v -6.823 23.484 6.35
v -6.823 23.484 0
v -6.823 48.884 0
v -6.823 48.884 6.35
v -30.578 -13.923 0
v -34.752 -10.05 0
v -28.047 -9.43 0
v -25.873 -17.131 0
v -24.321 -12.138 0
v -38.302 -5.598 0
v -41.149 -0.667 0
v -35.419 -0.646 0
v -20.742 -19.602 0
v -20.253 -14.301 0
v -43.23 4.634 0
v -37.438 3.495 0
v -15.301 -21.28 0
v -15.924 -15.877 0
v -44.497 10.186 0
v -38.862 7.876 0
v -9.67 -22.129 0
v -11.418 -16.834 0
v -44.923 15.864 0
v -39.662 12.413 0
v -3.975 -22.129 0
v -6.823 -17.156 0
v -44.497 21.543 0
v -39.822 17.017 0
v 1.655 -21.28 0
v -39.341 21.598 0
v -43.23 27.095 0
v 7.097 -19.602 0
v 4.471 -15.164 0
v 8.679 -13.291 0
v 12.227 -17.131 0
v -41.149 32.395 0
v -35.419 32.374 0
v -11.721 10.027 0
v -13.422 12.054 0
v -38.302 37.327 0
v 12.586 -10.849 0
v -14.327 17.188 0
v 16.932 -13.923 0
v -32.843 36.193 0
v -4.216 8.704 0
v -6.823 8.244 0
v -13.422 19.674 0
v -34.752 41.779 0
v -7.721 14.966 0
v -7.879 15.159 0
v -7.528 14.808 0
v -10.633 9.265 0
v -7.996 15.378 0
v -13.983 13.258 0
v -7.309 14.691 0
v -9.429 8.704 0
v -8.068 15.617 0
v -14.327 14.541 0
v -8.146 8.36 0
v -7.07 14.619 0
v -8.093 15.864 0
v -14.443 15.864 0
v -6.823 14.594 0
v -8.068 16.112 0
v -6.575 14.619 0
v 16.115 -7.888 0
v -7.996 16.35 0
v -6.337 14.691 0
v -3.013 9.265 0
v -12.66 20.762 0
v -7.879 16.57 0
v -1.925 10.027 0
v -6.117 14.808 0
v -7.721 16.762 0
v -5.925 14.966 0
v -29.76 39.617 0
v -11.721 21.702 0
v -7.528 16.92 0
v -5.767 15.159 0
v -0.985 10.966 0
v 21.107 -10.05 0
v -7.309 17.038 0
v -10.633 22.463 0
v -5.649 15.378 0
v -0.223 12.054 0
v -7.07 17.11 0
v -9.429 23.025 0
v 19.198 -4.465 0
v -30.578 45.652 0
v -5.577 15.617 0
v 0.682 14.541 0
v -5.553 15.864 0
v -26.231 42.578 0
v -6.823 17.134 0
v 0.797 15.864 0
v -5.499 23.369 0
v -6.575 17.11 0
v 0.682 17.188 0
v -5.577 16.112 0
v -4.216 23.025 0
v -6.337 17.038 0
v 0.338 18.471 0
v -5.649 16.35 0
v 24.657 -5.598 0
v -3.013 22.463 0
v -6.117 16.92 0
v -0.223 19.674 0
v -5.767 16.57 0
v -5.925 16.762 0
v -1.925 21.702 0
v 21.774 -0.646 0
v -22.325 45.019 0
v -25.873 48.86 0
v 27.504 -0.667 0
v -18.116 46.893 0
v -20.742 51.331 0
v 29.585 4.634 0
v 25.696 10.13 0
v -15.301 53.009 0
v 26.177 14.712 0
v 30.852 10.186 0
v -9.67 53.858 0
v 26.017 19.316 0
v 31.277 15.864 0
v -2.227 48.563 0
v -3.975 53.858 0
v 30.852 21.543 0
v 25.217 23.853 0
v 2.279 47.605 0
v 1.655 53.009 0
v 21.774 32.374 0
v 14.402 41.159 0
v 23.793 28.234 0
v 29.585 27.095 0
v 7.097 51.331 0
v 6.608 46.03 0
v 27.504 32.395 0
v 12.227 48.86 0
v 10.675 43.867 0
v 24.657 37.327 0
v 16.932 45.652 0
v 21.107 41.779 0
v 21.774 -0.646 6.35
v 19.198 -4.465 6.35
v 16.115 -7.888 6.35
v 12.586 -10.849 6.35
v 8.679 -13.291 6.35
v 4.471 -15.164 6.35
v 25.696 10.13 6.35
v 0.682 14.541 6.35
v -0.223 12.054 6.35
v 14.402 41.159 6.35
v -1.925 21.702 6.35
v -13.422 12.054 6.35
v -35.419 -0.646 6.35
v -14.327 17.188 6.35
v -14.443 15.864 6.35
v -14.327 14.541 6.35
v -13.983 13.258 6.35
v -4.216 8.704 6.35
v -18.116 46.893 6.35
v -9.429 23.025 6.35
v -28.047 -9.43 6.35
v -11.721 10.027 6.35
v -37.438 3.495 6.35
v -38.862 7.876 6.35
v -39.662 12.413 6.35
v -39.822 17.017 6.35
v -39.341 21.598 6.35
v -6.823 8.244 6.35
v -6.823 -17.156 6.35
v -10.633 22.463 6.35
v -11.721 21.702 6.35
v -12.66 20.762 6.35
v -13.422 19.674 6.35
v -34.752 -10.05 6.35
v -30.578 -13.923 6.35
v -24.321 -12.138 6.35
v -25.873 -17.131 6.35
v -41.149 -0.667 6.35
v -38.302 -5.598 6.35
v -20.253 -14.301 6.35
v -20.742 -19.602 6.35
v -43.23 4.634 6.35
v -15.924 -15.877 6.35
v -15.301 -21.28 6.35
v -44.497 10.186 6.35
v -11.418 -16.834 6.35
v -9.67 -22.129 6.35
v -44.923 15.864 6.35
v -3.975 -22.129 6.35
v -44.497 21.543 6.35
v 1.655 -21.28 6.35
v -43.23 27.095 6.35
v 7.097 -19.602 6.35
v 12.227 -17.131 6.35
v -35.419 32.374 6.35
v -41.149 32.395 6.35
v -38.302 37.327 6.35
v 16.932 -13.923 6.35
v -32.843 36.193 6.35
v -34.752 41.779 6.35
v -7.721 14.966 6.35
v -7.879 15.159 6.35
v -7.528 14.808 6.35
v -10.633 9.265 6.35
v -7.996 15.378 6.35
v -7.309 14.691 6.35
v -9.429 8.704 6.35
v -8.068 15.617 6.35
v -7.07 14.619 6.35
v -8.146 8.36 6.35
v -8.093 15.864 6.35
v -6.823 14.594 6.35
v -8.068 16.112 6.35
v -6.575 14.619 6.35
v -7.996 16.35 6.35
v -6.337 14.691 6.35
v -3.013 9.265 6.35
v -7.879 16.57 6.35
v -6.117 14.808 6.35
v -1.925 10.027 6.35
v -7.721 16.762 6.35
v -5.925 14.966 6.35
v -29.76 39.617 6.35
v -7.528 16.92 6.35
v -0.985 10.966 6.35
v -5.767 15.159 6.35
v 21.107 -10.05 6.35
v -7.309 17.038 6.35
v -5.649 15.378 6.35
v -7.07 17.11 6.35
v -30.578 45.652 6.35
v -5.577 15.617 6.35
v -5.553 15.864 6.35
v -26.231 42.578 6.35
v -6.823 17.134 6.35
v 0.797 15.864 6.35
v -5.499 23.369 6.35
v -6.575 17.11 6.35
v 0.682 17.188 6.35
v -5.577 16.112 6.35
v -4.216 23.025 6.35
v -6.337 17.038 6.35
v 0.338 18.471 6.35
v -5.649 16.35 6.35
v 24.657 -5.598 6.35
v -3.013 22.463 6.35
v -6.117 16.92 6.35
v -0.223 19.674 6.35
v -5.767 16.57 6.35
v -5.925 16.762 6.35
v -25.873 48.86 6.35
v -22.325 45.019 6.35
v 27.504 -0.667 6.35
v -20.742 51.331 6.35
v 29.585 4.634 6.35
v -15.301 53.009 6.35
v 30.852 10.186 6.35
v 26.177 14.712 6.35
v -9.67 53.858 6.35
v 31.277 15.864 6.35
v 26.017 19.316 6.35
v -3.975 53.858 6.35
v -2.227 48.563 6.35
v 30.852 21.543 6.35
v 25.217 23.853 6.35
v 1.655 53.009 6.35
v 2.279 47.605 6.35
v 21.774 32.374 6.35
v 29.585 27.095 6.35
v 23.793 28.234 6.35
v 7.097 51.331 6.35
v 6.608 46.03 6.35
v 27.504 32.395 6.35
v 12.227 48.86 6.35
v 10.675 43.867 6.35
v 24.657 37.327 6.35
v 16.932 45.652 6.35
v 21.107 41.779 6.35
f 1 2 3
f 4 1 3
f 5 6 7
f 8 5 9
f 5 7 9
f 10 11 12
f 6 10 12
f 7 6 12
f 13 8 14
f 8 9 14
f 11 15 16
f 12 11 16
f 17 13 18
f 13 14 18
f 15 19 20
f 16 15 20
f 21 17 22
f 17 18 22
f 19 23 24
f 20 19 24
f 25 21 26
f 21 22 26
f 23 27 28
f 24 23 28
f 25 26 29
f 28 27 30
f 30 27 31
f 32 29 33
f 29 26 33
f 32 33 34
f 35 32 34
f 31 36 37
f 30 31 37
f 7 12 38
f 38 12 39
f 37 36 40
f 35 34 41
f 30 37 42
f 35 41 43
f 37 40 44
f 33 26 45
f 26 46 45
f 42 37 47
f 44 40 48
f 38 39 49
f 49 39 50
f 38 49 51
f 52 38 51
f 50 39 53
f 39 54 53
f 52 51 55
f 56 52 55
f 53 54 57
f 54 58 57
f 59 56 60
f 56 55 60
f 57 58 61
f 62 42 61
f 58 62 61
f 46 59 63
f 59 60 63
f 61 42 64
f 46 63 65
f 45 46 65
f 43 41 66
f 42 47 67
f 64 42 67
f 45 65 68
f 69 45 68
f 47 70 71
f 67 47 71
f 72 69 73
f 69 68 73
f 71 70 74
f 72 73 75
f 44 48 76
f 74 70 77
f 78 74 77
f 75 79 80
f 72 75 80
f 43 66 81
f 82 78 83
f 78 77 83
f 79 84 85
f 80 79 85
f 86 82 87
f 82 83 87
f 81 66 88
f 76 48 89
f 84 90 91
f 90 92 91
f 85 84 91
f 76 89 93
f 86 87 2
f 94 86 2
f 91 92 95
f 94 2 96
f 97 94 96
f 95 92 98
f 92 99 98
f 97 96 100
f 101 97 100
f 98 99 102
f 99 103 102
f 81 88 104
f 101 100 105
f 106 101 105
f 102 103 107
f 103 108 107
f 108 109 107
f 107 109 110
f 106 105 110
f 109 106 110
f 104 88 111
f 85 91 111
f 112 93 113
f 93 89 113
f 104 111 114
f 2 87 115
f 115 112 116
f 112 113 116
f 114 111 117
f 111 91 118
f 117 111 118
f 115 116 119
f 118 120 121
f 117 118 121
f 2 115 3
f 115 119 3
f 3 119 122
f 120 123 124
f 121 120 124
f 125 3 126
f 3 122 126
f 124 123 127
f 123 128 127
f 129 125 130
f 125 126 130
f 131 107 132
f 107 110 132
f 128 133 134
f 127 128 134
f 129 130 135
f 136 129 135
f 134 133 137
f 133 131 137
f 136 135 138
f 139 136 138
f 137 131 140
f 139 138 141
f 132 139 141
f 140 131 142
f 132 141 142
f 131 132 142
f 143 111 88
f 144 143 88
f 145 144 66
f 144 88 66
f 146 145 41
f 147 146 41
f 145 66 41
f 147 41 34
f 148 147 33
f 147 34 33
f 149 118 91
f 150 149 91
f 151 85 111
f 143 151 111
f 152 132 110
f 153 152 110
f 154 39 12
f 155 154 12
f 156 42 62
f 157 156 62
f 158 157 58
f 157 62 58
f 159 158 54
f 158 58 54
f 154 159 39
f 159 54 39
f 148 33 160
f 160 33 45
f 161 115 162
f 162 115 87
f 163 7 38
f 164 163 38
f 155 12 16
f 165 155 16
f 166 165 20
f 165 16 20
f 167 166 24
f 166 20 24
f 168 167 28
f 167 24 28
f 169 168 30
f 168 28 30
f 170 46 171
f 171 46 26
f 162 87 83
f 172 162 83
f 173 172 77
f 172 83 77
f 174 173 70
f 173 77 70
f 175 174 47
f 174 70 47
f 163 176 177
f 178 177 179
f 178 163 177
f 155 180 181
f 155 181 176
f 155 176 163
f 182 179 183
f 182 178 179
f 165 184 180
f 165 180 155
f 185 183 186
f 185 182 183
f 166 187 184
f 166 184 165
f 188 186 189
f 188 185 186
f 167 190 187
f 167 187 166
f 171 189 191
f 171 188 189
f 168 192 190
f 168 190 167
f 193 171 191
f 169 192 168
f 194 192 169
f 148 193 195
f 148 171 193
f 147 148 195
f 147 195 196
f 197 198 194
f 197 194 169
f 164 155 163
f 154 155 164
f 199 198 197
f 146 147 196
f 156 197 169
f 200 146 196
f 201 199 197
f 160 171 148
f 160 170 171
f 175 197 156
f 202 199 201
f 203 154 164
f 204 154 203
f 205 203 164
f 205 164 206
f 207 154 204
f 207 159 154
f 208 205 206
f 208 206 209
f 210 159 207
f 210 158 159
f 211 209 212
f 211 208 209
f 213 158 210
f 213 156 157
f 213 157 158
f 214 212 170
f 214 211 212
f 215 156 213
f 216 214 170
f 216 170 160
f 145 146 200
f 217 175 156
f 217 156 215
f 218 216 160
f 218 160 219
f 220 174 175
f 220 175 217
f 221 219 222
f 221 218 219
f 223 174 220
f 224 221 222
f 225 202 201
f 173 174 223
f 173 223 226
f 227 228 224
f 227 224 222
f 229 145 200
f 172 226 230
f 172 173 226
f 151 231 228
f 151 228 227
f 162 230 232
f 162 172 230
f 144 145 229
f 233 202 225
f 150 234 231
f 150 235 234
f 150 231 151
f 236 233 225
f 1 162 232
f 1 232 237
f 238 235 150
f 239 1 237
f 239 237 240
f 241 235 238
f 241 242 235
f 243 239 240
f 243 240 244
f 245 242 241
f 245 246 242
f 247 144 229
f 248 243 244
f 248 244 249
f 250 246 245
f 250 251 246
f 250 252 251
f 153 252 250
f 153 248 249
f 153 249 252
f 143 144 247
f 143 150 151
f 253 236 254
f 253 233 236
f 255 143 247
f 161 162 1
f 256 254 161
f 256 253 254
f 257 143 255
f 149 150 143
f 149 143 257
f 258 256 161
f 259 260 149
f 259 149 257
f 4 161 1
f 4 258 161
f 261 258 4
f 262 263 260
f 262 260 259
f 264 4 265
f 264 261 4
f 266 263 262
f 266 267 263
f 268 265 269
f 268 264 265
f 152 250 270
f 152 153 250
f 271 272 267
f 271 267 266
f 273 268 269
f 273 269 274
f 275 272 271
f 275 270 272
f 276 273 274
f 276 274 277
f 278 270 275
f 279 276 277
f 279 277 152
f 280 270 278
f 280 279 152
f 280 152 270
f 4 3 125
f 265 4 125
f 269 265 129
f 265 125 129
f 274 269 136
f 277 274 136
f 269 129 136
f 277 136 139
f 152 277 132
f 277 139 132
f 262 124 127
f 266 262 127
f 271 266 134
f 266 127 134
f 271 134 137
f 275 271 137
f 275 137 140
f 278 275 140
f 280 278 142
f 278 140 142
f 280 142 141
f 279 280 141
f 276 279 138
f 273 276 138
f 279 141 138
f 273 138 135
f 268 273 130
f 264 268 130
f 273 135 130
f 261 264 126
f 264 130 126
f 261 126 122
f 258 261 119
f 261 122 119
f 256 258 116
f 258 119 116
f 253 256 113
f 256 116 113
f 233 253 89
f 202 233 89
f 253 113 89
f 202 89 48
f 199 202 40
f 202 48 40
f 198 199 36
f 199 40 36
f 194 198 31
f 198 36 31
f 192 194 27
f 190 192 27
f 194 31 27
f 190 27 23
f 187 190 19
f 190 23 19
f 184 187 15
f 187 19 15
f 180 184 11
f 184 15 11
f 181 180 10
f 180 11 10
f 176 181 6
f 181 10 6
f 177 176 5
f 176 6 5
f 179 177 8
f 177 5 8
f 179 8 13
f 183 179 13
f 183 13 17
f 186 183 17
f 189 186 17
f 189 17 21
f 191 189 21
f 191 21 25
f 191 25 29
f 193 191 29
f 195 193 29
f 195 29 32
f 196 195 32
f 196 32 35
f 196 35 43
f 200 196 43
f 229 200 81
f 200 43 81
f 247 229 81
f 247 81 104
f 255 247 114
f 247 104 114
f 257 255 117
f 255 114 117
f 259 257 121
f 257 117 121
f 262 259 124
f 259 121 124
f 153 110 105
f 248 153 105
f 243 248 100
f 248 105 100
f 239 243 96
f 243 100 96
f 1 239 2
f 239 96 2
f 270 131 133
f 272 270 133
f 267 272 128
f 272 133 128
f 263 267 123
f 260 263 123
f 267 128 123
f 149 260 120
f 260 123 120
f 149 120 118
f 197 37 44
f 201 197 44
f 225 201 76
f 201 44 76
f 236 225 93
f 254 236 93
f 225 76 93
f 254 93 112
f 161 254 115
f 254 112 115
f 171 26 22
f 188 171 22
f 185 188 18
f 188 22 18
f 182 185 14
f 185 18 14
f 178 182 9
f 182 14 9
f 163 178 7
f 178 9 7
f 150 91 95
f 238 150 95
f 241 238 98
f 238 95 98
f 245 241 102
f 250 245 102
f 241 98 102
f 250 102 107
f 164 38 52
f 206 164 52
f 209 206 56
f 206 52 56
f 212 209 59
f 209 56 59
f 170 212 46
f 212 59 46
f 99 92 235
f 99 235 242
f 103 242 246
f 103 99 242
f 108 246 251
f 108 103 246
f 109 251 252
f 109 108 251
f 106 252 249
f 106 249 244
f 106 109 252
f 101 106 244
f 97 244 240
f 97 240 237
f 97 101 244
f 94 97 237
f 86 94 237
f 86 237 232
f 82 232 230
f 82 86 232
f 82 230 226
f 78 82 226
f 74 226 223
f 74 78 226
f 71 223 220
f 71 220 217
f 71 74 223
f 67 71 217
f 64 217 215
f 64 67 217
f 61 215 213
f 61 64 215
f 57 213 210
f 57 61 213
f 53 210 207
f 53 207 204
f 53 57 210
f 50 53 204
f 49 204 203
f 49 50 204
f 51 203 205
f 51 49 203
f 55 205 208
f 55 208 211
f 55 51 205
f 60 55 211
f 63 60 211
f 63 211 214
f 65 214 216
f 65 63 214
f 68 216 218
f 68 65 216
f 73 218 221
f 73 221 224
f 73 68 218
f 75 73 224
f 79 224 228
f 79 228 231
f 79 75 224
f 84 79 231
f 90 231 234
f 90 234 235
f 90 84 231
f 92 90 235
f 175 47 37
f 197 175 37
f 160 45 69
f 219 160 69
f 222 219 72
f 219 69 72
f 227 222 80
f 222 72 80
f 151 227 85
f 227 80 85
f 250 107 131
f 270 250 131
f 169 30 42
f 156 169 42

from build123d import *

# Parameters (mm, degrees)
F0_R     = 38.1
F0_R_2   = 1.27
F1_DEPTH = 6.35


with BuildPart() as f1:
    # F0 (on Top) → F1 (new body)
    with BuildSketch(Plane.XY):
        with Locations((-6.822567, 15.864339)):
            Circle(F0_R)
        with BuildLine():
            ThreePointArc((-11.720609, 10.02708), (-9.428761, 8.703881), (-6.822567, 8.244339))
            Line((-6.822567, 8.244339), (-6.822567, -17.155661))
            ThreePointArc((-6.822567, -17.155661), (-18.116073, -15.164312), (-28.047414, -9.430449))
            Line((-28.047414, -9.430449), (-11.720609, 10.02708))
        make_face(mode=Mode.SUBTRACT)
        with BuildLine():
            ThreePointArc((-14.326803, 17.187538), (-14.326803, 14.54114), (-13.421681, 12.054339))
            Line((-13.421681, 12.054339), (-35.418726, -0.645661))
            ThreePointArc((-35.418726, -0.645661), (-39.340919, 10.130476), (-39.340919, 21.598202))
            Line((-39.340919, 21.598202), (-14.326803, 17.187538))
        make_face(mode=Mode.SUBTRACT)
        with BuildLine():
            ThreePointArc((-4.216374, 8.703881), (-1.924526, 10.02708), (-0.223454, 12.054339))
            Line((-0.223454, 12.054339), (21.773591, -0.645661))
            ThreePointArc((21.773591, -0.645661), (14.402279, -9.430449), (4.470938, -15.164312))
            Line((4.470938, -15.164312), (-4.216374, 8.703881))
        make_face(mode=Mode.SUBTRACT)
        with BuildLine():
            ThreePointArc((-9.428761, 23.024796), (-11.720609, 21.701597), (-13.421681, 19.674339))
            Line((-13.421681, 19.674339), (-35.418726, 32.374339))
            ThreePointArc((-35.418726, 32.374339), (-28.047414, 41.159126), (-18.116073, 46.892989))
            Line((-18.116073, 46.892989), (-9.428761, 23.024796))
        make_face(mode=Mode.SUBTRACT)
        with Locations((-6.822567, 15.864339)):
            Circle(F0_R_2, mode=Mode.SUBTRACT)
        with BuildLine():
            ThreePointArc((0.681668, 14.54114), (0.681668, 17.187538), (-0.223454, 19.674339))
            Line((-0.223454, 19.674339), (21.773591, 32.374339))
            ThreePointArc((21.773591, 32.374339), (25.695785, 21.598202), (25.695785, 10.130476))
            Line((25.695785, 10.130476), (0.681668, 14.54114))
        make_face(mode=Mode.SUBTRACT)
        with BuildLine():
            ThreePointArc((-6.822567, 48.884339), (4.470938, 46.892989), (14.402279, 41.159126))
            Line((14.402279, 41.159126), (-1.924526, 21.701597))
            ThreePointArc((-1.924526, 21.701597), (-4.216374, 23.024796), (-6.822567, 23.484339))
            Line((-6.822567, 23.484339), (-6.822567, 48.884339))
        make_face(mode=Mode.SUBTRACT)
    extrude(amount=F1_DEPTH)


solid = f1.part
